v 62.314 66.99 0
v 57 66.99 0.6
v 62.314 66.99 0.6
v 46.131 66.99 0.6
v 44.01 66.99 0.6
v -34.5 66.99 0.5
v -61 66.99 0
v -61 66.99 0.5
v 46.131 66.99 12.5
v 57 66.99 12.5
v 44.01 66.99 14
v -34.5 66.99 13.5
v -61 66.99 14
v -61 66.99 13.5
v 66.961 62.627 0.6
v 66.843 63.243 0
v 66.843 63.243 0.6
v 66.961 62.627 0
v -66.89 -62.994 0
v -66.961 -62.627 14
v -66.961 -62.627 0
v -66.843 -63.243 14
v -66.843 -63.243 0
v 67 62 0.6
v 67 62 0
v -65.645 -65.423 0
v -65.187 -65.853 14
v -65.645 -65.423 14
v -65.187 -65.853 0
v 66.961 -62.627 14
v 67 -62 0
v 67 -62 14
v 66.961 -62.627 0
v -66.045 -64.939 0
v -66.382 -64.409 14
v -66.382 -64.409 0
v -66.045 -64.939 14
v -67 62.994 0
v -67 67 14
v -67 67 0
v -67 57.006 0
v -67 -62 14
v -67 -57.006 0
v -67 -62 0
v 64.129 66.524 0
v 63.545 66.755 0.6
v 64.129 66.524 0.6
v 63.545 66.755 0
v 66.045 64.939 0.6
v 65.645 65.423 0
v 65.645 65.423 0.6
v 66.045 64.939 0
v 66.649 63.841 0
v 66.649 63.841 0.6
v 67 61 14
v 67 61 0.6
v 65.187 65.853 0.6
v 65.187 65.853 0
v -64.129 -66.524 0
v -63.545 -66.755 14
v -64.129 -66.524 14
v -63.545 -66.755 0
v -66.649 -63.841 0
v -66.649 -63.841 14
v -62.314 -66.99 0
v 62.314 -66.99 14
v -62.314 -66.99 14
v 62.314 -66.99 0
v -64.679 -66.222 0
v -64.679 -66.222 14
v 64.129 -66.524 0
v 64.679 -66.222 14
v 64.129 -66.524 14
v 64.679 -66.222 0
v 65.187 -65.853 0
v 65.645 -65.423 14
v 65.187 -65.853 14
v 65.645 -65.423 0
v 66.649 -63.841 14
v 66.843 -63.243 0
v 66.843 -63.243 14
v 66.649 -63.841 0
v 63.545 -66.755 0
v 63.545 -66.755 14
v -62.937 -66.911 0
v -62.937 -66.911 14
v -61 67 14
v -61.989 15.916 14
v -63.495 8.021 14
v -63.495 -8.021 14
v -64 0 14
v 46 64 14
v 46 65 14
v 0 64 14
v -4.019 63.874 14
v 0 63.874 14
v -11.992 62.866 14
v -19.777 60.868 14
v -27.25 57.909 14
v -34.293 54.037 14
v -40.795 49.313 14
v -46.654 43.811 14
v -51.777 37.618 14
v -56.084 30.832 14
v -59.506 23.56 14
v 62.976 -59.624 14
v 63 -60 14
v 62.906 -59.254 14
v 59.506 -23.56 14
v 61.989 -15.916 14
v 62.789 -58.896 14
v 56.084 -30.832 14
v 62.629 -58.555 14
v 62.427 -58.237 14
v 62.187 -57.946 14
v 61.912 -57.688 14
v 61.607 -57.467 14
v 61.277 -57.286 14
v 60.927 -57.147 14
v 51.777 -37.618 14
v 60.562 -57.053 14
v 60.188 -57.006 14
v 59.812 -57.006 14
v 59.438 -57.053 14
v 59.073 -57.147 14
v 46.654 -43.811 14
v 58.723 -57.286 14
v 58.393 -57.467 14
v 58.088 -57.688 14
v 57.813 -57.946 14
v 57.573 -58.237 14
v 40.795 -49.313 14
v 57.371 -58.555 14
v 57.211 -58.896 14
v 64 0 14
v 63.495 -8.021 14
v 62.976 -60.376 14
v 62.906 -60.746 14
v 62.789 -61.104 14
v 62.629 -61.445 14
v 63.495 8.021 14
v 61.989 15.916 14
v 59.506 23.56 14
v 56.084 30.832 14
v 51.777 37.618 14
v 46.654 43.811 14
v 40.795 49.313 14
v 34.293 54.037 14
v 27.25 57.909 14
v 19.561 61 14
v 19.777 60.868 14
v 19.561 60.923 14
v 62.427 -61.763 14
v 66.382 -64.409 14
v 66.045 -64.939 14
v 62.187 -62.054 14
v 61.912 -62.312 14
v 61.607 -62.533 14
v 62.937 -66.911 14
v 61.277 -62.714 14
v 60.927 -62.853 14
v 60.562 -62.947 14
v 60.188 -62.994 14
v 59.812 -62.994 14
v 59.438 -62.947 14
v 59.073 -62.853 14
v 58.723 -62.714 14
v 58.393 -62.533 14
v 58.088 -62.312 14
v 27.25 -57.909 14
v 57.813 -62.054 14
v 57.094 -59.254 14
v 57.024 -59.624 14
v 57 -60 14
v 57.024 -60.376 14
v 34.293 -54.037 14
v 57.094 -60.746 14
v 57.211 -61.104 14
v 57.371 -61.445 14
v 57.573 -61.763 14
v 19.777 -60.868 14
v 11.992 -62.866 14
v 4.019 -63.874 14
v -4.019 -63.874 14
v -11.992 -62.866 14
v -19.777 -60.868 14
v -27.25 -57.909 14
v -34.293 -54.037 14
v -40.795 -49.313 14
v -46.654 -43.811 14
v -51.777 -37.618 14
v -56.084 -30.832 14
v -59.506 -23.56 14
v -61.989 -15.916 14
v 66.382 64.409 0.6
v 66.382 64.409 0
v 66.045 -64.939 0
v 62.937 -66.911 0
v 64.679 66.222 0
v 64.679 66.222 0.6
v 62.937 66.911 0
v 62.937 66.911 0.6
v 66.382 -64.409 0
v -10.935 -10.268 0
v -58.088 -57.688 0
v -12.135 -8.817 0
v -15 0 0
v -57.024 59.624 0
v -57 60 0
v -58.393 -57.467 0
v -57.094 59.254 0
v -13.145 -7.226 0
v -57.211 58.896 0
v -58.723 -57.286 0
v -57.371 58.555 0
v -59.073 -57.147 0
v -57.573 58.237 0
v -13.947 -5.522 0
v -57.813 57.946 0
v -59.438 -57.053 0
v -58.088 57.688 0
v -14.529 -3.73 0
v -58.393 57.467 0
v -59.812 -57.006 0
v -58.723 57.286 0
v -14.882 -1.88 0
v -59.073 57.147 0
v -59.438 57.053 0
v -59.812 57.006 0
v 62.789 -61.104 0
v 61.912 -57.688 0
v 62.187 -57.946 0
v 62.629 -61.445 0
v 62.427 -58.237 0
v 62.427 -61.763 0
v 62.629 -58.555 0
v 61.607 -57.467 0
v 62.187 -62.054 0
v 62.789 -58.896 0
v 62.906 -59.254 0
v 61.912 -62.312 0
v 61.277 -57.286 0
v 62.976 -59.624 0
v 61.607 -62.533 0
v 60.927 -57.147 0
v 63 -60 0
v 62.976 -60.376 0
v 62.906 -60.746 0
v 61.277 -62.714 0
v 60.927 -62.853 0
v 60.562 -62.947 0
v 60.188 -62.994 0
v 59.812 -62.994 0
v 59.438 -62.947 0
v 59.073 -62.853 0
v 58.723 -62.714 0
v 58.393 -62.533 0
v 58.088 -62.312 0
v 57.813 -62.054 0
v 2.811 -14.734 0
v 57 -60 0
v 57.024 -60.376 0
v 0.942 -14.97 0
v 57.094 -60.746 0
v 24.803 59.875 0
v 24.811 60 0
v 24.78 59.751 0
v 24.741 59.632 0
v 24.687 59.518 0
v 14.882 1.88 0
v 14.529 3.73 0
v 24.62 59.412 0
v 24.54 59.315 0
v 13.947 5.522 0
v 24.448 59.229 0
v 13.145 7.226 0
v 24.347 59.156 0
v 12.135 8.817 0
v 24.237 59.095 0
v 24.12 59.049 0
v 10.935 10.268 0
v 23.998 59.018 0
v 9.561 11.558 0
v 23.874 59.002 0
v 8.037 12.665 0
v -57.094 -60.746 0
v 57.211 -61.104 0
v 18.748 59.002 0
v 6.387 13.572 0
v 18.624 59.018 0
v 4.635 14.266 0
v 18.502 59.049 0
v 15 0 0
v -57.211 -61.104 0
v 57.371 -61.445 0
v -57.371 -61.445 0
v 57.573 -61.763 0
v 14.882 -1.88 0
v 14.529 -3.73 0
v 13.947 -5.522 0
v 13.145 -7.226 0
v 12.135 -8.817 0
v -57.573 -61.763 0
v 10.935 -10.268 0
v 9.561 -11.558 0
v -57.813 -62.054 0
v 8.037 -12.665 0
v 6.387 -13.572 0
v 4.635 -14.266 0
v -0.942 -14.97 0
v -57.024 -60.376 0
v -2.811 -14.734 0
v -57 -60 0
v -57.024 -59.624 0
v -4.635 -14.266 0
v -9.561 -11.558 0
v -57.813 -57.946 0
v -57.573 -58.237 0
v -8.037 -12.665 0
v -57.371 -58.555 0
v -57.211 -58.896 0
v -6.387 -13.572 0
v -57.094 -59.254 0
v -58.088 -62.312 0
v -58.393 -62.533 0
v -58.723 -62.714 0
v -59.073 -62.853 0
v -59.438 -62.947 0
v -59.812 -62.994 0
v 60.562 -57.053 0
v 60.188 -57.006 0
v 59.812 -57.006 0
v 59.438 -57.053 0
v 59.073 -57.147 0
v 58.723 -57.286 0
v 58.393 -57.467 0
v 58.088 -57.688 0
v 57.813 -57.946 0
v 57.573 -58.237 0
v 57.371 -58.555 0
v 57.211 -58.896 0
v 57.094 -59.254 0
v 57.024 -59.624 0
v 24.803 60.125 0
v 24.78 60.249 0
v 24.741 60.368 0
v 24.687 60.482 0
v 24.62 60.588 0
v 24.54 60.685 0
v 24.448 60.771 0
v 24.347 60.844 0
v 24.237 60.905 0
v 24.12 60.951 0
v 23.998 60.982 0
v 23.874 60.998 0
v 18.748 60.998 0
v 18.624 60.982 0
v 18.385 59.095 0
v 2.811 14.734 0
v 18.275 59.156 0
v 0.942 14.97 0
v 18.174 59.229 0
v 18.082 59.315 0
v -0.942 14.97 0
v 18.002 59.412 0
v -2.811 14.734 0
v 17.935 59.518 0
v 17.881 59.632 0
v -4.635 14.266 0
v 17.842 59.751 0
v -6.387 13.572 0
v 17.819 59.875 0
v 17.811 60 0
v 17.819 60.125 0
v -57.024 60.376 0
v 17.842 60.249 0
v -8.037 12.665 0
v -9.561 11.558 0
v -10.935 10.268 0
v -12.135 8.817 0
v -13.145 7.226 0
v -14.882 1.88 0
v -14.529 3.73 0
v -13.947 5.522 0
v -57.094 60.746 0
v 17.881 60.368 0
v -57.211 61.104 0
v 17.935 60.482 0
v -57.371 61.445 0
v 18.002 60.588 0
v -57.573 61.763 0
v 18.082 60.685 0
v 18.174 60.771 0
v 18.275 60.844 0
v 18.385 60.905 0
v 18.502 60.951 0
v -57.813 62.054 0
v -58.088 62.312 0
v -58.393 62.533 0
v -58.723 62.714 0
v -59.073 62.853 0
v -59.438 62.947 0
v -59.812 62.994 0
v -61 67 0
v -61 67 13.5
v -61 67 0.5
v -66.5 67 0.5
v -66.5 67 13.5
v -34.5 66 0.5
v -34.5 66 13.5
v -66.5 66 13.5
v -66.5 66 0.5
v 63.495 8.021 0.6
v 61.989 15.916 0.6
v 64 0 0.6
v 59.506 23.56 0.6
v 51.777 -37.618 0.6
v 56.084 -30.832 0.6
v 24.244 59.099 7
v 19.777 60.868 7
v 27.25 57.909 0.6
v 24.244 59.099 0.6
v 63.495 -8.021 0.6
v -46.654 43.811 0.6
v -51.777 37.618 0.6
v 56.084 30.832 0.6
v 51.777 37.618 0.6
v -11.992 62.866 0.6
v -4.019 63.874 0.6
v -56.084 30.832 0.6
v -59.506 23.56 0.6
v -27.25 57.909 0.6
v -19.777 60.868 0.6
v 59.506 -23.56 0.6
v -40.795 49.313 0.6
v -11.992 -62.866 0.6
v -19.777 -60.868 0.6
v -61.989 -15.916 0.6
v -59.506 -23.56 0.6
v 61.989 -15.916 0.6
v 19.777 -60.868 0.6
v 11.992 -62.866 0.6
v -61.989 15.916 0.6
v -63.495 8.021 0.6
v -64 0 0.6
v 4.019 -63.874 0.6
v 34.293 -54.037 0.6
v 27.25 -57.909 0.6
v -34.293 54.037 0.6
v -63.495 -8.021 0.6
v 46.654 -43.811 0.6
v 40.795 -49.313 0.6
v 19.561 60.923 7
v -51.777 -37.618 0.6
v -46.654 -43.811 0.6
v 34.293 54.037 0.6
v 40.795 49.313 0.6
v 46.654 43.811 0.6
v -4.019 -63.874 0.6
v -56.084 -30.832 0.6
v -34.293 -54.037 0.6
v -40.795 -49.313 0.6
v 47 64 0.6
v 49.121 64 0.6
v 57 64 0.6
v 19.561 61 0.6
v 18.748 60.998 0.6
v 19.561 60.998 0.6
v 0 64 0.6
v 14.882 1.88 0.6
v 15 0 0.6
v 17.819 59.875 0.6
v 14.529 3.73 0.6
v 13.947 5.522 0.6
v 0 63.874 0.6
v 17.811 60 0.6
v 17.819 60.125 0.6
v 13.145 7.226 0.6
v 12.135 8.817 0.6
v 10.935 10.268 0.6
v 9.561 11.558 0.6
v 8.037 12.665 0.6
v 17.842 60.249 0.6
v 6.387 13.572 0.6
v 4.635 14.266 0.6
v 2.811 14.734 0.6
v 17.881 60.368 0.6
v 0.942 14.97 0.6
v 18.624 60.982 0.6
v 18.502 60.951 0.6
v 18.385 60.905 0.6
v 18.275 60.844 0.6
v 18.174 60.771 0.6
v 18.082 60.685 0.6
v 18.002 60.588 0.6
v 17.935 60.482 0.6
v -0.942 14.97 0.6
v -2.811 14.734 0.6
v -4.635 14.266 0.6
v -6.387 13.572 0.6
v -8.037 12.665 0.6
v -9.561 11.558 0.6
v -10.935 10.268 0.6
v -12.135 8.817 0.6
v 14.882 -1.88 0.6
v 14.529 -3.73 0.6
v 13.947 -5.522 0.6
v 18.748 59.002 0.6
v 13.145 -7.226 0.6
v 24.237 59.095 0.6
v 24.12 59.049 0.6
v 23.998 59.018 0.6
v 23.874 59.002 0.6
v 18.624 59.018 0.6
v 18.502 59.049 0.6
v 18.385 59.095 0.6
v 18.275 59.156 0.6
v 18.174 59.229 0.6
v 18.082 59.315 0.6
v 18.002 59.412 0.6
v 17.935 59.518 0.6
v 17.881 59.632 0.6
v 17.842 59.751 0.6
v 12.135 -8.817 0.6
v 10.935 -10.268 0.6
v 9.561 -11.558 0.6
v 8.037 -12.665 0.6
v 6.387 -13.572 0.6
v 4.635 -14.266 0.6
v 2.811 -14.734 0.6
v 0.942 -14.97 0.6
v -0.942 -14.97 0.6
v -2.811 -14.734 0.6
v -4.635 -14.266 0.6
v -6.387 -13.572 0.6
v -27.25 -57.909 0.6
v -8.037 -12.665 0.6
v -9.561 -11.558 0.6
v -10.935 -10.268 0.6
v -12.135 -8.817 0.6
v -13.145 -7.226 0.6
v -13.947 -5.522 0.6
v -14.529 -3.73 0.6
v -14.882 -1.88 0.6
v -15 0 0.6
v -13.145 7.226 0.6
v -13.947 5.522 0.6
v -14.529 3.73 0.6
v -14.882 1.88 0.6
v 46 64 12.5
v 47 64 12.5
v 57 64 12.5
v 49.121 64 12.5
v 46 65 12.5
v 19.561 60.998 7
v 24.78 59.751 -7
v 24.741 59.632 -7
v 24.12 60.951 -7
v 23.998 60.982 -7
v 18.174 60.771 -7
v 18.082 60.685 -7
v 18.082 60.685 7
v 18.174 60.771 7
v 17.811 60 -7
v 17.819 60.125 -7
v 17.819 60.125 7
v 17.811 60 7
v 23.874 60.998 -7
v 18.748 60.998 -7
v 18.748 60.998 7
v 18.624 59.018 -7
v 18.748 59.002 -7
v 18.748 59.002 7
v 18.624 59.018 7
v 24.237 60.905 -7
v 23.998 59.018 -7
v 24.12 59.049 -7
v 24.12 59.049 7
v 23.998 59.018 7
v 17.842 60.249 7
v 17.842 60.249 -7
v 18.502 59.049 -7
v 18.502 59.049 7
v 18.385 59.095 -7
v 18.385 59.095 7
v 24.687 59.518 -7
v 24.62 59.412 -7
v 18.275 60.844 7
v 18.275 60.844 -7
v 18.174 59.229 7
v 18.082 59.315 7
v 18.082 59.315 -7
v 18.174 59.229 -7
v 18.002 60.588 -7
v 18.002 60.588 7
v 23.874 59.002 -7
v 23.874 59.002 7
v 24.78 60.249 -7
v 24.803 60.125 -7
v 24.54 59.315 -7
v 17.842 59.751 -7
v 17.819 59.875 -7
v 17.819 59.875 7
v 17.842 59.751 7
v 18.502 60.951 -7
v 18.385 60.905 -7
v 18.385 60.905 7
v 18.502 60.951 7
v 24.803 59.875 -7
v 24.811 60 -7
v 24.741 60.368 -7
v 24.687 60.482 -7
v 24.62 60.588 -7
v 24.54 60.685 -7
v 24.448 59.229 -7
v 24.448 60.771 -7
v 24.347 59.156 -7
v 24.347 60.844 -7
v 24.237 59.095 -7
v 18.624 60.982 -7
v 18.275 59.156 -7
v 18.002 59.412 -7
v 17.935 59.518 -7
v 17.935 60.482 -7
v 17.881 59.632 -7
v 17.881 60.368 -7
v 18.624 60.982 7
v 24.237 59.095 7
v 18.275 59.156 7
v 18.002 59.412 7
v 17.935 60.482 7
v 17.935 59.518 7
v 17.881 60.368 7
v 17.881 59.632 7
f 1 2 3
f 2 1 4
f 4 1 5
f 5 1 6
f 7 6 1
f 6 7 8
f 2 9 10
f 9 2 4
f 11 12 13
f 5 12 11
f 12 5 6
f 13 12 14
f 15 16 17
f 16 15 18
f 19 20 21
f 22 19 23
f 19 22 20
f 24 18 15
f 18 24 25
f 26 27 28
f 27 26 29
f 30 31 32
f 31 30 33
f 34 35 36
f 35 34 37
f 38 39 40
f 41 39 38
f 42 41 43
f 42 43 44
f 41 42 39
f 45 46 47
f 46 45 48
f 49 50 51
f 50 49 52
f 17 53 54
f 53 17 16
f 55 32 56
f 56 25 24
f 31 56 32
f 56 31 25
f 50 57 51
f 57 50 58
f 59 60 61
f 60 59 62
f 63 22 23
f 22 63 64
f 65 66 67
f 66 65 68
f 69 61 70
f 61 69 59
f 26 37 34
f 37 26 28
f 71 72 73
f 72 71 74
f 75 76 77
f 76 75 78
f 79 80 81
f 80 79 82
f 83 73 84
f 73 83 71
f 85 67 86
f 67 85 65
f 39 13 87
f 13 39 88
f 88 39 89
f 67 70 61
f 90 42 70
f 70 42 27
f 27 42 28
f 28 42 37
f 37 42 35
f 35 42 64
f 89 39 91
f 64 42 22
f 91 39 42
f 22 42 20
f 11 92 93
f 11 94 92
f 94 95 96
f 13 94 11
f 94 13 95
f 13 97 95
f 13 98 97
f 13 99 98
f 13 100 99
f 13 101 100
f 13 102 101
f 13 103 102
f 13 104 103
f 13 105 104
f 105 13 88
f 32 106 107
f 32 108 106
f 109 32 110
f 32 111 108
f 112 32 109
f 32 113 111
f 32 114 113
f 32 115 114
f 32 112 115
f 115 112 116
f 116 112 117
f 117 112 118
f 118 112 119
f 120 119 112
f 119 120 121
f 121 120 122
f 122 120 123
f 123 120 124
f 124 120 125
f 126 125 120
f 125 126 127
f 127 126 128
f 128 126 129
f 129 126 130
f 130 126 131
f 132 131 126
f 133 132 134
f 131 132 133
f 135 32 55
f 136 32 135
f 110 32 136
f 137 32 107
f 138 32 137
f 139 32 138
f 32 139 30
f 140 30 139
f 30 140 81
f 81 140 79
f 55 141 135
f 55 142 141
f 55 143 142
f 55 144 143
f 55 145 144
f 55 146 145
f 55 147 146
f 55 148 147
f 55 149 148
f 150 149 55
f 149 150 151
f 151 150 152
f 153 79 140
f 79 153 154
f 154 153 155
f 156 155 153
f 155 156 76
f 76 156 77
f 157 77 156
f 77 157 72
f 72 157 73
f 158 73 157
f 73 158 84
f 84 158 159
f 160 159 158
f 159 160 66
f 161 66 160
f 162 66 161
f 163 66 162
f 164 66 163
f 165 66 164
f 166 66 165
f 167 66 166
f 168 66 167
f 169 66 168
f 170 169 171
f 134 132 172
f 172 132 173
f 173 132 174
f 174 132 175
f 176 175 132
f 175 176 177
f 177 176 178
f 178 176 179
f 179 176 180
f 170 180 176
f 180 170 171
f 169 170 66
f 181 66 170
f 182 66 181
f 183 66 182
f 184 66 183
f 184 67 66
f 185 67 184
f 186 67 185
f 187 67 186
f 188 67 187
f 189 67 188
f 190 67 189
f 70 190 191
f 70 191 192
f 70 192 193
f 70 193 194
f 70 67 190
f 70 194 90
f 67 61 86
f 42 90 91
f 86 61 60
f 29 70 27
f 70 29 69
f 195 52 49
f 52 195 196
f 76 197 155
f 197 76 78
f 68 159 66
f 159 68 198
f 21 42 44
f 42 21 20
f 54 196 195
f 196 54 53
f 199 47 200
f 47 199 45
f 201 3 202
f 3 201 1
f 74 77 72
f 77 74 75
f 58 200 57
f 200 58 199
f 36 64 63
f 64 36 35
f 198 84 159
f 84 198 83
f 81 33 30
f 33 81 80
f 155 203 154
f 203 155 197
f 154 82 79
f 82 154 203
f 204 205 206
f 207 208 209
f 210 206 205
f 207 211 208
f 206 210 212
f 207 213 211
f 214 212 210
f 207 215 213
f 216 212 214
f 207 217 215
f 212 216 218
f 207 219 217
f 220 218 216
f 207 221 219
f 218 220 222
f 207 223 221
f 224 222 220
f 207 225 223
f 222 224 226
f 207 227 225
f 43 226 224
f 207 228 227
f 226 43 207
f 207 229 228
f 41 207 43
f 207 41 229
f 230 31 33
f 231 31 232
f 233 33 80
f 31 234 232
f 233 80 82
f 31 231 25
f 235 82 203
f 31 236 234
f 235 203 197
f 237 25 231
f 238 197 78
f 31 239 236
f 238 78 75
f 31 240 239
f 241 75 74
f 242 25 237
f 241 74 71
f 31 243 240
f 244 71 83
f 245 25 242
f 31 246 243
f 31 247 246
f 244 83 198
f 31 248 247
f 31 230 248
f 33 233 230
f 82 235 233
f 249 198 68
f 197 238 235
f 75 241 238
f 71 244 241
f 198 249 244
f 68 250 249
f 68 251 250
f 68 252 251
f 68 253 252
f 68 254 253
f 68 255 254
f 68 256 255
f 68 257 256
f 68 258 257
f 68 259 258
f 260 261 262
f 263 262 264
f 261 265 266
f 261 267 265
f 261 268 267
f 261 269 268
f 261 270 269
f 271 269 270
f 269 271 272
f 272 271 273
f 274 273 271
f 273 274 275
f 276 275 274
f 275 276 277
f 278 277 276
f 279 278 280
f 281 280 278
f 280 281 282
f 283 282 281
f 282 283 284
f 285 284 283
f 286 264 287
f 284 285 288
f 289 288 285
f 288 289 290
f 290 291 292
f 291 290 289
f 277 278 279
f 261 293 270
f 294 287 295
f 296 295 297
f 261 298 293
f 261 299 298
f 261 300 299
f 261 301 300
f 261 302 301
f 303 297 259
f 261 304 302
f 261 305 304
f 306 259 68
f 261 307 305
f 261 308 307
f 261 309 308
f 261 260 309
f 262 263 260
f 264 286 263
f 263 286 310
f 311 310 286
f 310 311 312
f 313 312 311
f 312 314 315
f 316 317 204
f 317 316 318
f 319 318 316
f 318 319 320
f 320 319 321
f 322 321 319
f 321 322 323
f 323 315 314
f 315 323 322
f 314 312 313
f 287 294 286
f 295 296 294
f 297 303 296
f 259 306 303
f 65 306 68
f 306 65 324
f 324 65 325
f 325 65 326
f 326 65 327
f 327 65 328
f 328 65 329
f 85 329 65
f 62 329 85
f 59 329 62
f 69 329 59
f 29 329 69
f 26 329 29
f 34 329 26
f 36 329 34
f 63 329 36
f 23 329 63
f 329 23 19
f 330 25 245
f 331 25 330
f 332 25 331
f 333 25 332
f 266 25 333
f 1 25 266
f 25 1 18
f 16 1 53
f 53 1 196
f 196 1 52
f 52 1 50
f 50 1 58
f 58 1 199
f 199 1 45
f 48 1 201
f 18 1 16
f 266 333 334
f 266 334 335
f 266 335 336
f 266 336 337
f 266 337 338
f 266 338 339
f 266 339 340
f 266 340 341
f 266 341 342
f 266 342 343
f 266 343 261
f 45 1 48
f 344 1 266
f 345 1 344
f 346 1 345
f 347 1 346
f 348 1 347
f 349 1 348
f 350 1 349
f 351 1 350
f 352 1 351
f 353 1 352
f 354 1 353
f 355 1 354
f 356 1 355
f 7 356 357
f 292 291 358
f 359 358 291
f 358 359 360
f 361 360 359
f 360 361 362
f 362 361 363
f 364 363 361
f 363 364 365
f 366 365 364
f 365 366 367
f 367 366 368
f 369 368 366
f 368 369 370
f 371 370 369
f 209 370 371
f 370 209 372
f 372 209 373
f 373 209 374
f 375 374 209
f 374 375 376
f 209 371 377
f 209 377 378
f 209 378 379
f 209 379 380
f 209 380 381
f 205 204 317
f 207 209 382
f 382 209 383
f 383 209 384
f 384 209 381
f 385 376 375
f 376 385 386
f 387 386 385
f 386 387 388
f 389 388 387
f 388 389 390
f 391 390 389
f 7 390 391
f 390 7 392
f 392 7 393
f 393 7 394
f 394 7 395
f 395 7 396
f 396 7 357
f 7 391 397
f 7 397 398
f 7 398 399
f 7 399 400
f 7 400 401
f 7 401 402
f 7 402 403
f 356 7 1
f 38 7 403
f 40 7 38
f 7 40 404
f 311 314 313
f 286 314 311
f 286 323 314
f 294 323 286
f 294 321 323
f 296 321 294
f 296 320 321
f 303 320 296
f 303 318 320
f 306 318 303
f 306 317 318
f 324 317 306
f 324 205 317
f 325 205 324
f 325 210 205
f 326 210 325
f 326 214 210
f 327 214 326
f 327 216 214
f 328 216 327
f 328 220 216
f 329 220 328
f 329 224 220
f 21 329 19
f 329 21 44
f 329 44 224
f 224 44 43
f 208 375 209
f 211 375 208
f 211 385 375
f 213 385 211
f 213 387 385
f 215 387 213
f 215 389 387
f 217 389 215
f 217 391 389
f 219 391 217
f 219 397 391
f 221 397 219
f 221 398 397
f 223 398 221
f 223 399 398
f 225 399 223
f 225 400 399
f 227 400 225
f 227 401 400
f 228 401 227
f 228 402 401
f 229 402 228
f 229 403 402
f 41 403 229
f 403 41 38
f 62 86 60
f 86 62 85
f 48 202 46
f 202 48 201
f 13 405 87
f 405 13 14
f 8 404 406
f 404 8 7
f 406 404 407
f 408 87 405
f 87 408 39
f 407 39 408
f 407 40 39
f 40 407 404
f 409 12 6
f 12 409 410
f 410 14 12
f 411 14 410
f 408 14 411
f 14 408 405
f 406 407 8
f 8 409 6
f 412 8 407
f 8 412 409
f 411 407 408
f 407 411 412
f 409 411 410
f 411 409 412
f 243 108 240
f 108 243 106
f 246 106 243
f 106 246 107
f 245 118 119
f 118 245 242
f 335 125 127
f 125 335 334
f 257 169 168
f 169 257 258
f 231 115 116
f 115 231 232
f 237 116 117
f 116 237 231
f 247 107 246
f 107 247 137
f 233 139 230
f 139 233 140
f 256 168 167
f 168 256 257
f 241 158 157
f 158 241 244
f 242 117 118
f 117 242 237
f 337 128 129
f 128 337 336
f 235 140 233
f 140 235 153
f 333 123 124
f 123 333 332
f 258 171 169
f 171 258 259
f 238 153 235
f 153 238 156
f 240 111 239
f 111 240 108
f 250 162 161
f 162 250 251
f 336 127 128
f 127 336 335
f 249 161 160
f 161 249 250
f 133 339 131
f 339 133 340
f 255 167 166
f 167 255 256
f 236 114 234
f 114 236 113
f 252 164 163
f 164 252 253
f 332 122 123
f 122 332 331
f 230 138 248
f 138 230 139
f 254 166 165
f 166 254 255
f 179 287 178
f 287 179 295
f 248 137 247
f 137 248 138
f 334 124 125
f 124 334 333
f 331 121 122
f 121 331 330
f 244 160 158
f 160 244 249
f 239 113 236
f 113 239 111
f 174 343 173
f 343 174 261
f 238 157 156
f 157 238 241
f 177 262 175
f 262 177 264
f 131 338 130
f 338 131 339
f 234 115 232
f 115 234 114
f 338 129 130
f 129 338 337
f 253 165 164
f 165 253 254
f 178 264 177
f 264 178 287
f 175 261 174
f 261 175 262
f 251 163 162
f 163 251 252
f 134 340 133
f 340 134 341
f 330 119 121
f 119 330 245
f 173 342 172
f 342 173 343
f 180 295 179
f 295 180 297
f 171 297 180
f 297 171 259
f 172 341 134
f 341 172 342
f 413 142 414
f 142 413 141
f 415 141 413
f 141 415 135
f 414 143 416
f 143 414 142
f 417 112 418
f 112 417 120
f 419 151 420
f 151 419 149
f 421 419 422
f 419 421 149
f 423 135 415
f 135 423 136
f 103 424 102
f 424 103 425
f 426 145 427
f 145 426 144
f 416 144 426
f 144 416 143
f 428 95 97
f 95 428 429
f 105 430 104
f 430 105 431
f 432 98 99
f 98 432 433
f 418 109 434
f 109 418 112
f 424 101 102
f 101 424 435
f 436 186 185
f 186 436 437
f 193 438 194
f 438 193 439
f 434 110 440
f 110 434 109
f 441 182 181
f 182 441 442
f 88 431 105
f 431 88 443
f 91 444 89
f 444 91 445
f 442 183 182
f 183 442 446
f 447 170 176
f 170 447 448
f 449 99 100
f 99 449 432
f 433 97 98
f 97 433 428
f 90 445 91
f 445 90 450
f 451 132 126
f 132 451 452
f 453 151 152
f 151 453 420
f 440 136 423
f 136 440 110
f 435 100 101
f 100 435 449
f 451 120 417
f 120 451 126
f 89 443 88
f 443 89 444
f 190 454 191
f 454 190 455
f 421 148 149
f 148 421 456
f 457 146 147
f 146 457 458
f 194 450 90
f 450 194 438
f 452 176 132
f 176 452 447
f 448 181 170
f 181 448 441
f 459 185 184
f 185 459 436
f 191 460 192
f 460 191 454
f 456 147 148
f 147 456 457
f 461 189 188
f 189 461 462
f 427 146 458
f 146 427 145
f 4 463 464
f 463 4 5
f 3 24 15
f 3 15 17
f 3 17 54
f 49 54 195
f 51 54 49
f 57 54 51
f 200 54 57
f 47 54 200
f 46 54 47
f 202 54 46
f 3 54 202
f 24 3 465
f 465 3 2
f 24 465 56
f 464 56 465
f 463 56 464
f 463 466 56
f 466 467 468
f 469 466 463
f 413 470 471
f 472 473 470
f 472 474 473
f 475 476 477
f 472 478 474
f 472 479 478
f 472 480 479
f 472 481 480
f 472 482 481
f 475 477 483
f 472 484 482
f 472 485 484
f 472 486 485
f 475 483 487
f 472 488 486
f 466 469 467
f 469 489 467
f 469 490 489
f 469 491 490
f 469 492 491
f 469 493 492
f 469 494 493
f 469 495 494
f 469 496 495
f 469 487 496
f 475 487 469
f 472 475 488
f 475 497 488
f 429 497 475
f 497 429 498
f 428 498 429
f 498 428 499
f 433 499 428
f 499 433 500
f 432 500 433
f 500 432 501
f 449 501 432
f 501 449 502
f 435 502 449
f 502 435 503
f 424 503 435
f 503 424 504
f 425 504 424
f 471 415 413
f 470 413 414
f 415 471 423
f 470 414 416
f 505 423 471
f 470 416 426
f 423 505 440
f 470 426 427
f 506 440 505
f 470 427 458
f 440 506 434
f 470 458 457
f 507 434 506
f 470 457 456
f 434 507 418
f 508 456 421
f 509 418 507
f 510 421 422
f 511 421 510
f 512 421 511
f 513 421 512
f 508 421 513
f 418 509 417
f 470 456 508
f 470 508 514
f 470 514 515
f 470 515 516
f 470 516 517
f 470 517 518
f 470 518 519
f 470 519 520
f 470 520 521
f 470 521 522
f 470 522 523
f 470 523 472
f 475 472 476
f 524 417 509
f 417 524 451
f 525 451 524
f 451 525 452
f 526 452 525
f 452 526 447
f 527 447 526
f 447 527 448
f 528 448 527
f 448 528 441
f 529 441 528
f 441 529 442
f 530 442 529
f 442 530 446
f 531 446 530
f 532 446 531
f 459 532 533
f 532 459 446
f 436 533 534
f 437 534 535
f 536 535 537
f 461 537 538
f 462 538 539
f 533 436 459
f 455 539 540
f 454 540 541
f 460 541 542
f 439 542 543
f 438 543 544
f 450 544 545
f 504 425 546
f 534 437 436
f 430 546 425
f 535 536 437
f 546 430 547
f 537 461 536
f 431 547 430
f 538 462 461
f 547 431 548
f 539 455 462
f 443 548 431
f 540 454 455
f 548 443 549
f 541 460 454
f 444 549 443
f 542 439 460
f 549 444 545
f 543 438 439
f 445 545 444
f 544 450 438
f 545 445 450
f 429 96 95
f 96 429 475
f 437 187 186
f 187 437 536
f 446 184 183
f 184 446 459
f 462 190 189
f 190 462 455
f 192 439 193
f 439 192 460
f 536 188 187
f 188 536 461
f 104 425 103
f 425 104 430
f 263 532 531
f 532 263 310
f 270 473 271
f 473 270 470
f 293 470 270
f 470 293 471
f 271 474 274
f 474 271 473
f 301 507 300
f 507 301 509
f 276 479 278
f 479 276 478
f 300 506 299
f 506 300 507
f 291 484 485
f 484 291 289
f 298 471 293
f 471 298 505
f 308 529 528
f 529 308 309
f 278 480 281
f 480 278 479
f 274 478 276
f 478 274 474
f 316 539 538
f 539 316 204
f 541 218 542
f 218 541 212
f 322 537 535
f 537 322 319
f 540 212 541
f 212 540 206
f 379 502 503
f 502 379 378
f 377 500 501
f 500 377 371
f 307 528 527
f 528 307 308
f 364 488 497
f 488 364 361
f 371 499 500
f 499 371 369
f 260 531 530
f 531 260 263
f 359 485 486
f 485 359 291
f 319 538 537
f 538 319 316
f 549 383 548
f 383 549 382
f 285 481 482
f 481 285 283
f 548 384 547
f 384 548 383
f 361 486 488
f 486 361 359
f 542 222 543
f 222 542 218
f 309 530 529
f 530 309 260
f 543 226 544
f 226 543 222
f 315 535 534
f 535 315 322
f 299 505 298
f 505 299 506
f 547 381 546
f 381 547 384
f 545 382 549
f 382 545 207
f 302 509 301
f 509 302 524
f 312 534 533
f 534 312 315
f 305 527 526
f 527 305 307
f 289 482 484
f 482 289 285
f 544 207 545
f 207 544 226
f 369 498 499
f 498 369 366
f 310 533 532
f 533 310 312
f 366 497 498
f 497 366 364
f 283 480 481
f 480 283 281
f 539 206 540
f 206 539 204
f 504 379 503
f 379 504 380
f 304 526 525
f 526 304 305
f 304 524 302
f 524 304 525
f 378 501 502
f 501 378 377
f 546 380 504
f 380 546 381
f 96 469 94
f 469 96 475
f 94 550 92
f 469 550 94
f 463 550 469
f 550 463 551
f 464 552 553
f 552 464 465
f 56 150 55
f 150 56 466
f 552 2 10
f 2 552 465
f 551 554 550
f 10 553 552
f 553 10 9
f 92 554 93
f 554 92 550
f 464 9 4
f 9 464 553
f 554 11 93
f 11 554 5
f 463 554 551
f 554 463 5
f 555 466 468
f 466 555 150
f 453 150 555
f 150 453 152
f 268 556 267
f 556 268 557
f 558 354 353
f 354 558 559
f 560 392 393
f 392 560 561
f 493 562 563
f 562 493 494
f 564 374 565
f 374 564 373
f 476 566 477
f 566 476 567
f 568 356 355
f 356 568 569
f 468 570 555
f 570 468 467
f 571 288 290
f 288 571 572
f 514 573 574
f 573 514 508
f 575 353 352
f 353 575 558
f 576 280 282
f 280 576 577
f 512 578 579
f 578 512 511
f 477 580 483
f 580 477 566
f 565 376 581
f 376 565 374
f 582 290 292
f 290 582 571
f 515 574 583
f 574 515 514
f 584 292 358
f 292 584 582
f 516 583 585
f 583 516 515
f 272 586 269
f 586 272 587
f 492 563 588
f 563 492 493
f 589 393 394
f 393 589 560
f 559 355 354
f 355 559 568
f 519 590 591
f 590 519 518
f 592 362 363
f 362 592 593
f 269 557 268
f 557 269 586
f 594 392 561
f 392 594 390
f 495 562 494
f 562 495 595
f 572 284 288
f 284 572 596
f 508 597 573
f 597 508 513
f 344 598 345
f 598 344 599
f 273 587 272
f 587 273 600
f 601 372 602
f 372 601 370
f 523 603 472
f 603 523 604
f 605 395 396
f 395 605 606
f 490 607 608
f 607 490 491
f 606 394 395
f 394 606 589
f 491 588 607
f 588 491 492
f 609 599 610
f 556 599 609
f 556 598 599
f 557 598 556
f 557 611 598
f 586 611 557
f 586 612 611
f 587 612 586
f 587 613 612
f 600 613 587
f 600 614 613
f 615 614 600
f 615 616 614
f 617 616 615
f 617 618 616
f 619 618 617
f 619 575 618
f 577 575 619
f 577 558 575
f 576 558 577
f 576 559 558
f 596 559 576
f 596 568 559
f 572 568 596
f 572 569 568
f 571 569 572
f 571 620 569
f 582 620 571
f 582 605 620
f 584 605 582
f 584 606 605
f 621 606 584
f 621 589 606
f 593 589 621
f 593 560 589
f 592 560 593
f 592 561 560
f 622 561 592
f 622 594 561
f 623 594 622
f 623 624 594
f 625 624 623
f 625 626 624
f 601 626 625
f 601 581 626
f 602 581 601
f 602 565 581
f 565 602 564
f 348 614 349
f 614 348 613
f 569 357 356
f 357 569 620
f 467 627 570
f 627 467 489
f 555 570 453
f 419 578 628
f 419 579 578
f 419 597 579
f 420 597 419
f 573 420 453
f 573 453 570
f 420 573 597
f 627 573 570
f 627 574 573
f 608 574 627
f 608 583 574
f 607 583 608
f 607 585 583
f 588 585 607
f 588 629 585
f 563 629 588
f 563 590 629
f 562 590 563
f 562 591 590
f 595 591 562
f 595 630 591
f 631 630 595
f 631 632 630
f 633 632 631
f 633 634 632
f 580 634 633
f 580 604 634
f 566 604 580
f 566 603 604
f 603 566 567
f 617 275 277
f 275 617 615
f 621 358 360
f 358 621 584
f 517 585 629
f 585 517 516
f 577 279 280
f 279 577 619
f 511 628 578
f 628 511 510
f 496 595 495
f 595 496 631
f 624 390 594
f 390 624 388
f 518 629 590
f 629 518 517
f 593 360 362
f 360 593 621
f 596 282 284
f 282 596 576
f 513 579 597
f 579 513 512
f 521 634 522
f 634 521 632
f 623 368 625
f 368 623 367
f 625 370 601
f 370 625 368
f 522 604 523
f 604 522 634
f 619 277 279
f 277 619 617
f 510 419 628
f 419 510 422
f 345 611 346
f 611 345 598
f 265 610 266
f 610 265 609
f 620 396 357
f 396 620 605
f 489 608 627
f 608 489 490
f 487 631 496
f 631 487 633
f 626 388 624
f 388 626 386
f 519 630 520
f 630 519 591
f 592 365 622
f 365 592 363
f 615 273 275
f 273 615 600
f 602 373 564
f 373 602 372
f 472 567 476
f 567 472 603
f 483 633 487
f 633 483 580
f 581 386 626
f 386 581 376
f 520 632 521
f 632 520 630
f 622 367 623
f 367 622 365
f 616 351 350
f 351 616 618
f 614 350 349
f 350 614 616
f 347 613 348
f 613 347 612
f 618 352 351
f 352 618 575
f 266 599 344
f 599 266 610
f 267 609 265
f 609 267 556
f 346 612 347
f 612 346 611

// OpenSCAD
$fn = 50;


union() {
	difference() {
		union() {
			hull() {
				translate(v = [-62.0000000000, 62.0000000000, 0]) {
					cylinder(h = 14, r = 5);
				}
				translate(v = [62.0000000000, 62.0000000000, 0]) {
					cylinder(h = 14, r = 5);
				}
				translate(v = [-62.0000000000, -62.0000000000, 0]) {
					cylinder(h = 14, r = 5);
				}
				translate(v = [62.0000000000, -62.0000000000, 0]) {
					cylinder(h = 14, r = 5);
				}
			}
			translate(v = [-67.0000000000, 61.0000000000, 0]) {
				cube(size = [6, 6, 14]);
			}
		}
		union() {
			translate(v = [-67.5000000000, -60.0000000000, -250.0000000000]) {
				rotate(a = [0, 0, 0]) {
					difference() {
						union() {
							hull() {
								translate(v = [7.5000000000, 0, 0]) {
									cylinder(h = 250, r = 3.0000000000, r1 = 3.0000000000, r2 = 3.0000000000);
								}
								translate(v = [-7.5000000000, 0, 0]) {
									cylinder(h = 250, r = 3.0000000000, r1 = 3.0000000000, r2 = 3.0000000000);
								}
							}
						}
						union();
					}
				}
			}
			translate(v = [-67.5000000000, 60.0000000000, -250.0000000000]) {
				rotate(a = [0, 0, 0]) {
					difference() {
						union() {
							hull() {
								translate(v = [7.5000000000, 0, 0]) {
									cylinder(h = 250, r = 3.0000000000, r1 = 3.0000000000, r2 = 3.0000000000);
								}
								translate(v = [-7.5000000000, 0, 0]) {
									cylinder(h = 250, r = 3.0000000000, r1 = 3.0000000000, r2 = 3.0000000000);
								}
							}
						}
						union();
					}
				}
			}
			translate(v = [-66.5000000000, 66.0000000000, 0.5000000000]) {
				cube(size = [32, 1, 13.0000000000]);
			}
			translate(v = [60.0000000000, -60.0000000000, 0]) {
				cylinder(h = 100, r = 3.0000000000);
			}
			translate(v = [0, 0, 0.6000000000]) {
				cylinder(h = 16.4000000000, r = 64.0000000000);
			}
			translate(v = [0, 0, -7.0000000000]) {
				cylinder(h = 14, r = 15.0000000000);
			}
			translate(v = [0.0000000000, 61.0000000000, 0.6000000000]) {
				cube(size = [67.0000000000, 3, 16.4000000000]);
			}
			translate(v = [57.0000000000, 61.0000000000, 0.6000000000]) {
				cube(size = [10, 6, 16.4000000000]);
			}
			translate(v = [46.0000000000, 61.0000000000, 12.5000000000]) {
				cube(size = [21, 6, 1.5000000000]);
			}
			translate(v = [43.2500000000, 67.7500000000, 0.6000000000]) {
				rotate(a = [0, 0, -45]) {
					cube(size = [7.5000000000, 1.5000000000, 16.4000000000]);
				}
			}
			translate(v = [12.0610000000, 59.0000000000, 0.6000000000]) {
				cube(size = [7.5000000000, 2, 13.4000000000]);
			}
		}
	}
	union() {
		translate(v = [21.3110000000, 60.0000000000, -7.0000000000]) {
			rotate(a = [0, 0, 0]) {
				difference() {
					union() {
						#hull() {
							#translate(v = [2.5000000000, 0, 0]) {
								cylinder(h = 14, r = 1.0000000000, r1 = 1.0000000000, r2 = 1.0000000000);
							}
							#translate(v = [-2.5000000000, 0, 0]) {
								cylinder(h = 14, r = 1.0000000000, r1 = 1.0000000000, r2 = 1.0000000000);
							}
						}
					}
					union();
				}
			}
		}
	}
}
